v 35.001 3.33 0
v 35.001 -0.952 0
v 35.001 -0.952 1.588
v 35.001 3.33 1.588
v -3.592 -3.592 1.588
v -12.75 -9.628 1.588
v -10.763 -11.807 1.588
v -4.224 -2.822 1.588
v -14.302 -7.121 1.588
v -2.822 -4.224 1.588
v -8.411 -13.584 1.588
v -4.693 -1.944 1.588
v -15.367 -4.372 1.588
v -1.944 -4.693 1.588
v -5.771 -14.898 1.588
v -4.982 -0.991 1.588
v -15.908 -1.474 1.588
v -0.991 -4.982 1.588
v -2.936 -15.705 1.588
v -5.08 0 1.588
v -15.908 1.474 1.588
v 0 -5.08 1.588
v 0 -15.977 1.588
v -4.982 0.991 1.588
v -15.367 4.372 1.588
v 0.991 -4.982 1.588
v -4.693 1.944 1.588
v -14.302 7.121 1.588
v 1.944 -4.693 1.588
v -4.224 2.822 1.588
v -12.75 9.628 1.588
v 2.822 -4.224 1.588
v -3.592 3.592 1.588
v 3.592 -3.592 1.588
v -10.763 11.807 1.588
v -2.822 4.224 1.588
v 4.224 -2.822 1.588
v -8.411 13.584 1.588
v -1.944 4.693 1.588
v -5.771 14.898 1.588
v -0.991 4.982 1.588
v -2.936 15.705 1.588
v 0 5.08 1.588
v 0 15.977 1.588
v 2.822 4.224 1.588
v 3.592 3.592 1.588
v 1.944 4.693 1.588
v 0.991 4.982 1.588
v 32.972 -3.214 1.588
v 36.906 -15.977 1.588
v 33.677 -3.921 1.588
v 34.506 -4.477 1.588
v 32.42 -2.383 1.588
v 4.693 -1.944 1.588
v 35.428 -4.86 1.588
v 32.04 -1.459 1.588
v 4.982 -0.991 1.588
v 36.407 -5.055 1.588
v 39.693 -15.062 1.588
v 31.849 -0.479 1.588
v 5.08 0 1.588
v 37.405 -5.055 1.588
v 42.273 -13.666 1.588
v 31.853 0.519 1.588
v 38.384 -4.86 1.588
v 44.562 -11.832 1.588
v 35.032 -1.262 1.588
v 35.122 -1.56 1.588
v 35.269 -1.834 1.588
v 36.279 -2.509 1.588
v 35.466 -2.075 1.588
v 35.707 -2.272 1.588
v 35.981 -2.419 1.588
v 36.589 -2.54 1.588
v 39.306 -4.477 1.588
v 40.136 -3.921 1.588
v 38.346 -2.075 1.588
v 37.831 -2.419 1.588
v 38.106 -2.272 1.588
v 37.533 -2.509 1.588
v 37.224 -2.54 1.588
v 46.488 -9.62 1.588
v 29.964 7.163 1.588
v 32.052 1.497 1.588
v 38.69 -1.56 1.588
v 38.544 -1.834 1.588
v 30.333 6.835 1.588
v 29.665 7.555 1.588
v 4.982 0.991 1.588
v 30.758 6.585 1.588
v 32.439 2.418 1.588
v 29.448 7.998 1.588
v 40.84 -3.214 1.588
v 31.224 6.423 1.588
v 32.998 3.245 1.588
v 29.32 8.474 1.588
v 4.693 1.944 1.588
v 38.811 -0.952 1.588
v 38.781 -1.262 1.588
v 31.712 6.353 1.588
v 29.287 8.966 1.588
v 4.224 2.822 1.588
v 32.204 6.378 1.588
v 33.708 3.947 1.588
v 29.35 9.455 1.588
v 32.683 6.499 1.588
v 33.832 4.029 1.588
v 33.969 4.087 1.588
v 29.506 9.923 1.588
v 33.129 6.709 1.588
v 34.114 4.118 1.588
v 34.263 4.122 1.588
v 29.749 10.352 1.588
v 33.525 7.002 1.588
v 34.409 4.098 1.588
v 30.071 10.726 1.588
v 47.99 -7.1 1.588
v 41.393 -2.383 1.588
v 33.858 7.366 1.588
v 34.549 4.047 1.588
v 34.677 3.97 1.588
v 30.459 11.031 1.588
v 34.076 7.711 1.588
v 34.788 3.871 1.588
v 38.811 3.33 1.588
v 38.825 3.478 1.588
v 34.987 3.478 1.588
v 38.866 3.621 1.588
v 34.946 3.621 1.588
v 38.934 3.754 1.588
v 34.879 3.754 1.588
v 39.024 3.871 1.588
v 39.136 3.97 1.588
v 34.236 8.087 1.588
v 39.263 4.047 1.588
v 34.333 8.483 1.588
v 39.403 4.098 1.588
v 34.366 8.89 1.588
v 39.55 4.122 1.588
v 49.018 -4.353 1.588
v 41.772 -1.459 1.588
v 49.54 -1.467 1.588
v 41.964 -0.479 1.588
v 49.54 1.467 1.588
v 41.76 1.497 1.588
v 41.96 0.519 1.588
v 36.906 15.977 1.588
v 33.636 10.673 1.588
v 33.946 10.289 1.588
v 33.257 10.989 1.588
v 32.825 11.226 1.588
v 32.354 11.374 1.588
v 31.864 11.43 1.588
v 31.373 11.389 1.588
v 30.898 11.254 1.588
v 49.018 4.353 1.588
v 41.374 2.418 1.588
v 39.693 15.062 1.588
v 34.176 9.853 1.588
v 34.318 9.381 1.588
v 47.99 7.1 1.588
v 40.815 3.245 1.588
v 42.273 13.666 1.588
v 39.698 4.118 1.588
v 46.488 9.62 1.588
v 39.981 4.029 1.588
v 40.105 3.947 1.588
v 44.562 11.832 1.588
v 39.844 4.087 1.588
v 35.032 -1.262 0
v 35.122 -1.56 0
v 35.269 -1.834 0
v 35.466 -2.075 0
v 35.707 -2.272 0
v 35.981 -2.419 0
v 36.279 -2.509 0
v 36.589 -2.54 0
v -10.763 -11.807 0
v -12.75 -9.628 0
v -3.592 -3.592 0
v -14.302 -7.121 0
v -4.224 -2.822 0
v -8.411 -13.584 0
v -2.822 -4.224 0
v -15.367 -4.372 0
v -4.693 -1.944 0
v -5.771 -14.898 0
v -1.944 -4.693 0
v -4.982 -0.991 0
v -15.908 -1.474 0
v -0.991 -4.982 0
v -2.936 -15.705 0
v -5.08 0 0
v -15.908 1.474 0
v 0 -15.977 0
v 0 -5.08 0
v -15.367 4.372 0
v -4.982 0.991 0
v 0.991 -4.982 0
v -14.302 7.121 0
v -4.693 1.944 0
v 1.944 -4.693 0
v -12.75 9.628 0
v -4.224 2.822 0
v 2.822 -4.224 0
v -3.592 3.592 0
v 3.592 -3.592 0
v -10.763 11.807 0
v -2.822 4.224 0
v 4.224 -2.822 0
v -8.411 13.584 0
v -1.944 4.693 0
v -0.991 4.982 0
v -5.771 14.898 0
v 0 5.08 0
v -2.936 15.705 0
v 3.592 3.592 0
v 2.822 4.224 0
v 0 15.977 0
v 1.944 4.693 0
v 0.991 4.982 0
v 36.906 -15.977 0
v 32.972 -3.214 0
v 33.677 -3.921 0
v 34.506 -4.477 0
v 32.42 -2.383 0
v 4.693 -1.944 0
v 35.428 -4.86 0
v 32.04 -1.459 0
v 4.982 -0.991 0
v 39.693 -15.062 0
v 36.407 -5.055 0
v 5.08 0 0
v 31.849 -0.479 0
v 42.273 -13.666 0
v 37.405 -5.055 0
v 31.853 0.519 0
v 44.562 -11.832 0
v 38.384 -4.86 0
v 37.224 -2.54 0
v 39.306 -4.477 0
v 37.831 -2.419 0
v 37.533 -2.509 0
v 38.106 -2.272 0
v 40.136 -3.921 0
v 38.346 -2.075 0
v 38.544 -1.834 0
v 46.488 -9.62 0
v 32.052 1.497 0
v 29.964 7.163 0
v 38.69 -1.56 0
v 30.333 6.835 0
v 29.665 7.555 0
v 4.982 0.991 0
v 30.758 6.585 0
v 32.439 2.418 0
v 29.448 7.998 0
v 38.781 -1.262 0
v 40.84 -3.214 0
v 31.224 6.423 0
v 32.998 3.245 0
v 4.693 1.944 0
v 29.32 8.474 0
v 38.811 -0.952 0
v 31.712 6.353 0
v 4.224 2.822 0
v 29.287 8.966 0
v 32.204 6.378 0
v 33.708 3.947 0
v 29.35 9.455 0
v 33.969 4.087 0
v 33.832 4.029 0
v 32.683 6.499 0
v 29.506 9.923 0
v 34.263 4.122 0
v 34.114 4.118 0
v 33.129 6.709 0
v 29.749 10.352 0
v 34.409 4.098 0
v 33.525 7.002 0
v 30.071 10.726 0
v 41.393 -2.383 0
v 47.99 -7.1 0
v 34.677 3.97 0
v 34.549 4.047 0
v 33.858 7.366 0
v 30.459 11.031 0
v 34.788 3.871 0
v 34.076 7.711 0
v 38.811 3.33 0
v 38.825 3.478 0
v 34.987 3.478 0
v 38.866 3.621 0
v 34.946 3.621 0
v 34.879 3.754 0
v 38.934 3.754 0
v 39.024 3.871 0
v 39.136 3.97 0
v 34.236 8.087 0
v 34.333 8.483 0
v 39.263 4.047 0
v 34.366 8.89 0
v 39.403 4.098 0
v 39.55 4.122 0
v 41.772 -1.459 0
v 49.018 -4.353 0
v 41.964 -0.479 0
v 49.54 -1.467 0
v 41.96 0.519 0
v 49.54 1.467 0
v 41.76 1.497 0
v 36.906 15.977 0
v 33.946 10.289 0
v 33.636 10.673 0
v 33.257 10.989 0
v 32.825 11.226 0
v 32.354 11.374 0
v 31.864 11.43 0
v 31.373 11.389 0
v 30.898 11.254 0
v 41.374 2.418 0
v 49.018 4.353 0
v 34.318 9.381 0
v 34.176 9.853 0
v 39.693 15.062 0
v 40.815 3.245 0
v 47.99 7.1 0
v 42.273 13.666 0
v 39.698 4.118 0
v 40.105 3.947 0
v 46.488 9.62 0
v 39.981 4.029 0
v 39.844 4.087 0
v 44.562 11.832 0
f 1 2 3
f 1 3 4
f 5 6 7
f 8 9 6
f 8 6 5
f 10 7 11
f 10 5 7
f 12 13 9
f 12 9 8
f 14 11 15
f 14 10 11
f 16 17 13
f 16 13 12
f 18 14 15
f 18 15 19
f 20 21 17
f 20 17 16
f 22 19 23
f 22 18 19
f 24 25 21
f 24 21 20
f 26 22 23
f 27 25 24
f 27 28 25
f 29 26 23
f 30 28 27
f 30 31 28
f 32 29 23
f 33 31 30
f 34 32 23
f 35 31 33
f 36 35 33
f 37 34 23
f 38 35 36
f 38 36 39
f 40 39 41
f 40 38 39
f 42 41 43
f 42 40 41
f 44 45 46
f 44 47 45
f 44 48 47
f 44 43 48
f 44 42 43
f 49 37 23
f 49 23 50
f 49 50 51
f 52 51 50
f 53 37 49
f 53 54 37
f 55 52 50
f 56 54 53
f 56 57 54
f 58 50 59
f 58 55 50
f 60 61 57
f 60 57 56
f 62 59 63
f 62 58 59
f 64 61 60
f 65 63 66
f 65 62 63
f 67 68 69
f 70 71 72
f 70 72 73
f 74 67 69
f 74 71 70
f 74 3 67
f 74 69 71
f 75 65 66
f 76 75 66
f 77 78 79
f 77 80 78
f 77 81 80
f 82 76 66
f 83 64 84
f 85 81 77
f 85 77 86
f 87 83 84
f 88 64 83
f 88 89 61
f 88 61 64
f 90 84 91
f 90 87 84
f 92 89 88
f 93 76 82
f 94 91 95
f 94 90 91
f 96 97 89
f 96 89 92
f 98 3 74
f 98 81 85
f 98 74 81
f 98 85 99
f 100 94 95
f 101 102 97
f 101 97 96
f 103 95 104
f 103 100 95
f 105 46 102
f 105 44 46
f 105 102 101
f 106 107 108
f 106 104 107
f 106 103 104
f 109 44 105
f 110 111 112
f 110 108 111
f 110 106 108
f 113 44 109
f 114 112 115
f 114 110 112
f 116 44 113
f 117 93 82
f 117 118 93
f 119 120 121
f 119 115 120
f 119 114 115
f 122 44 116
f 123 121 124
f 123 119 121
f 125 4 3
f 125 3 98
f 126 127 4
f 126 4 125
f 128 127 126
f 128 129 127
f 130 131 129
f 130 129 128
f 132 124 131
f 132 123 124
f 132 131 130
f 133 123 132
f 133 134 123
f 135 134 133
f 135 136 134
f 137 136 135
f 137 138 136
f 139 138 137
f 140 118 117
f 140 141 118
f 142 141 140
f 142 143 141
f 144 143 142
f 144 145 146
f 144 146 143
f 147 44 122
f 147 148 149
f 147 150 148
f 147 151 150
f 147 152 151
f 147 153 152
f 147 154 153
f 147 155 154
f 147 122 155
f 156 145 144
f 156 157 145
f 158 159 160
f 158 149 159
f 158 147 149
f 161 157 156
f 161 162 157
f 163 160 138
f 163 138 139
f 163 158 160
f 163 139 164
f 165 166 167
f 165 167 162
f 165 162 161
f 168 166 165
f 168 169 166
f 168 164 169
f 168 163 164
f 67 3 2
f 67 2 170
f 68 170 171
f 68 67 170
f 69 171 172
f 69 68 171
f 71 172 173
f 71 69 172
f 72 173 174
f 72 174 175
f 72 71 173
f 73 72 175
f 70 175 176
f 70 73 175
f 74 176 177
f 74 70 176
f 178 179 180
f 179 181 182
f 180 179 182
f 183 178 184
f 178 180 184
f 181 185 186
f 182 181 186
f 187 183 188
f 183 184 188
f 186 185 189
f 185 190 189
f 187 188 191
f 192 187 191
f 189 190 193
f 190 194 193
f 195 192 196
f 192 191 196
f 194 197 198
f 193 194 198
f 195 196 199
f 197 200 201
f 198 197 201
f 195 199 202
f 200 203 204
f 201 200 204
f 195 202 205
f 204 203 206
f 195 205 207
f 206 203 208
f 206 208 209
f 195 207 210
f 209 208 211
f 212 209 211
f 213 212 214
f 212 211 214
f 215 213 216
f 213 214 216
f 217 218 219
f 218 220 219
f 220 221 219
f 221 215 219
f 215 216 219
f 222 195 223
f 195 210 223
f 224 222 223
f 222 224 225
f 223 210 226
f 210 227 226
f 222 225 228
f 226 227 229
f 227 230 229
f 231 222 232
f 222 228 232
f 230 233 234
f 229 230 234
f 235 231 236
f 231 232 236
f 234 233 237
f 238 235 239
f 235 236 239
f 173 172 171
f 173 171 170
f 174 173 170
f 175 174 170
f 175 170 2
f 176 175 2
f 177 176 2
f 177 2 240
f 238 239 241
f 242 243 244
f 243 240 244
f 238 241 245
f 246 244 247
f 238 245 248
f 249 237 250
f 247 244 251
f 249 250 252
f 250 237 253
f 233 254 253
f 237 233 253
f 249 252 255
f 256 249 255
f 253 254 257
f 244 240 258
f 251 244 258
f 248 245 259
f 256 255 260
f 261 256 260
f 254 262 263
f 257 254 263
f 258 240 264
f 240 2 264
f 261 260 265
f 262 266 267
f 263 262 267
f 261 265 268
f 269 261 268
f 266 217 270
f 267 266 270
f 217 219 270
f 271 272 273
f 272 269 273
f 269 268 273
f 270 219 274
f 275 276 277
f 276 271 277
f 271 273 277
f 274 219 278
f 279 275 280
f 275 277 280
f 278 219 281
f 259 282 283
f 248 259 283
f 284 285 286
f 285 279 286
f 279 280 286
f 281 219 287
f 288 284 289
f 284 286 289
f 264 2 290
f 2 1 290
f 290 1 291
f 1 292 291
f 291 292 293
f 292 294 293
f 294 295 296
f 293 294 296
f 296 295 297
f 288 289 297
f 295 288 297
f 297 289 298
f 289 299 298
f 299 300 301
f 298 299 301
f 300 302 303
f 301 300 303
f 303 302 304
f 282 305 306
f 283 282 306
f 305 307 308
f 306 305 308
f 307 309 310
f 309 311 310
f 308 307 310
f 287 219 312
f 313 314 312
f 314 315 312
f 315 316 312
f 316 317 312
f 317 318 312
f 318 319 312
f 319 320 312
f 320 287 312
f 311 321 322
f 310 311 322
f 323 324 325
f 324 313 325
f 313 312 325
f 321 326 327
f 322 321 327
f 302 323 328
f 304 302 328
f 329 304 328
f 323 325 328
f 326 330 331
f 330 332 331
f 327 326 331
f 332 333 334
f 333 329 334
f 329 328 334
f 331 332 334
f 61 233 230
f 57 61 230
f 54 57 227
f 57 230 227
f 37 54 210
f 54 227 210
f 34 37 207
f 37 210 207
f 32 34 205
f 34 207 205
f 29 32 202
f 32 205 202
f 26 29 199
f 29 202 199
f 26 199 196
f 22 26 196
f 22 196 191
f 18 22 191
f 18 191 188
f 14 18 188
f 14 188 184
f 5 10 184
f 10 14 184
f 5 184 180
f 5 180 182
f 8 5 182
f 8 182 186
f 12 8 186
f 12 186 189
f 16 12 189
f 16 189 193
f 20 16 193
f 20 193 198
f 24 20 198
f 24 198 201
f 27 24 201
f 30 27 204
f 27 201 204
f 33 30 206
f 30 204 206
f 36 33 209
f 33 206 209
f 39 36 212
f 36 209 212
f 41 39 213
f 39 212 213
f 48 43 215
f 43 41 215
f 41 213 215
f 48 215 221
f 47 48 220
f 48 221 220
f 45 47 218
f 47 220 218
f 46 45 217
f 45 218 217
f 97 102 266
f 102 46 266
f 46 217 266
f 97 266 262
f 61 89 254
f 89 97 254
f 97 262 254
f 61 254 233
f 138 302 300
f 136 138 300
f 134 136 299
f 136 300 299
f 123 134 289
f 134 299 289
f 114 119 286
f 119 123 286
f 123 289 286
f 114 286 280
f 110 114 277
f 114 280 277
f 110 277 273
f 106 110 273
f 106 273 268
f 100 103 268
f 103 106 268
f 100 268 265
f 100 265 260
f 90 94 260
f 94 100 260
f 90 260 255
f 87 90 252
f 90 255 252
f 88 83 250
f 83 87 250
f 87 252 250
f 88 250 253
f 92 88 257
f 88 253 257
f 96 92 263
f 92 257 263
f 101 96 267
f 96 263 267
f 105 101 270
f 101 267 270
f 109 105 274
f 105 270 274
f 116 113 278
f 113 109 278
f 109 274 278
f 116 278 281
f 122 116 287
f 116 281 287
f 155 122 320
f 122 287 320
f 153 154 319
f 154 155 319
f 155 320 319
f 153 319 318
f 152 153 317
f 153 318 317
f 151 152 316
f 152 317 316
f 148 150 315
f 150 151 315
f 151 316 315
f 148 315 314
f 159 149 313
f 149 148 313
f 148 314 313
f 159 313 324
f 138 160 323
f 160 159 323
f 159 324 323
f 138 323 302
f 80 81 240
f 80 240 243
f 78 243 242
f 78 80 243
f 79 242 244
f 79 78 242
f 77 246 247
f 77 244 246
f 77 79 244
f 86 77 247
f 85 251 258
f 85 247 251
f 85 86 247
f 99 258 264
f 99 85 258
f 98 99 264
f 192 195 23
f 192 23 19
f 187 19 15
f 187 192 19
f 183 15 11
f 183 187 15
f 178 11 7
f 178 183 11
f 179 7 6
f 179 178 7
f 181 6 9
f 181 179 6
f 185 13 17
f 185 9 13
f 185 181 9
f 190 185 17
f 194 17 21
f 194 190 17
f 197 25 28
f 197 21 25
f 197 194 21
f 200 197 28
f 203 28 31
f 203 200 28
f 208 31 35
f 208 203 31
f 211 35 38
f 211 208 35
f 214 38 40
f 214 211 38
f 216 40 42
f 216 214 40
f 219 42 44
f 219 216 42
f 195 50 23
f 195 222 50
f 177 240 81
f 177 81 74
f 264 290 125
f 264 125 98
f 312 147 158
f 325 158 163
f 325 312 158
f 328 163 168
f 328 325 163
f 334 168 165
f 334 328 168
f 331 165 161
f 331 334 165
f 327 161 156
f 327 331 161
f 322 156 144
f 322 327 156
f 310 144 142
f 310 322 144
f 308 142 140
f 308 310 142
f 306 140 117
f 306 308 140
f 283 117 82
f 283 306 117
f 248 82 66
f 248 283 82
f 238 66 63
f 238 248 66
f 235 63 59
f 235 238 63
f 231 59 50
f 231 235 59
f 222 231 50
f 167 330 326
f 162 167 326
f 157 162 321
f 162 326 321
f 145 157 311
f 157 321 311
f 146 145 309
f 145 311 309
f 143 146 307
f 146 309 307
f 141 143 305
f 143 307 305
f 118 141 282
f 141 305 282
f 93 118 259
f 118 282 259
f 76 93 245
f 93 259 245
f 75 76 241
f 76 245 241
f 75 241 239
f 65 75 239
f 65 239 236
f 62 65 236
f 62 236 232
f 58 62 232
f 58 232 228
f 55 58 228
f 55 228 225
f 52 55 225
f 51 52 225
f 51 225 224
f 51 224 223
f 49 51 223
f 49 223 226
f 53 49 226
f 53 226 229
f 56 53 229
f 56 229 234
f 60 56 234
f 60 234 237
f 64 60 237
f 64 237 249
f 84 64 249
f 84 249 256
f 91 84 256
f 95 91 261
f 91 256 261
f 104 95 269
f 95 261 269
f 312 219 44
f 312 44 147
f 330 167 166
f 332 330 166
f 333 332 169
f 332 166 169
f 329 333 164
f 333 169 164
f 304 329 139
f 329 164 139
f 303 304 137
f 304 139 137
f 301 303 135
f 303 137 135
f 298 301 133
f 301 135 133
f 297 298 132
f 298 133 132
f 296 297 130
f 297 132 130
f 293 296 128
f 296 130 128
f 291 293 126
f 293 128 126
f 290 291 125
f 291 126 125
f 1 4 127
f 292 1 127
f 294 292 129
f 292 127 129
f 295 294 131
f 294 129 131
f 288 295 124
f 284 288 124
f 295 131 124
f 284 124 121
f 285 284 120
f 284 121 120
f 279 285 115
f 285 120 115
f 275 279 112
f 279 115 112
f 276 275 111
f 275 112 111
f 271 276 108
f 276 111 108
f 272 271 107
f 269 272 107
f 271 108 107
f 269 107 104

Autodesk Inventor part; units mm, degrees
ref_plane "YZ Plane" through (0, 0, 0) normal (1, 0, 0) x (0, 1, 0)
ref_plane "XZ Plane" through (0, 0, 0) normal (0, 1, 0) x (-1, 0, 0)
ref_plane "XY Plane" through (0, 0, 0) normal (0, 0, 1) x (1, 0, 0)
sketch "Sketch1" plane through (0, 0, 0) normal (0, 0, 1) x (1, 0, 0)
  circle A0 centre (0, 0) radius 15.9766
  line L0 (0, 0) -> (36.9062, 0)
  circle A1 centre (36.9062, 0) radius 15.9766
  line L1 (36.9062, 0) -> (49.6062, 0)
  line L2 (36.9062, 0) -> (36.9062, 15.9766)
  line L3 (36.9062, 0) -> (36.9062, -15.9766)
  arc A2 (36.9062, -15.9766) -> (36.9062, 15.9766) centre (33.2069, 0) ccw
  circle A3 centre (36.9062, 0) radius 5.08
  circle A4 centre (0, 0) radius 5.08
  line L4 (0, 15.9766) -> (36.9062, 15.9766)
  line L5 (36.9062, -15.9766) -> (0, -15.9766)
  line L6 (31.8262, 0) -> (31.8262, 5.08)
  line L7 (31.8262, 5.08) -> (35.0012, 5.08)
  line L8 (35.0012, 5.08) -> (38.8112, 5.08)
  line L9 (38.8112, 5.08) -> (38.8112, -2.54)
  line L10 (38.8112, -2.54) -> (35.0012, -2.54)
  line L11 (35.0012, -2.54) -> (35.0012, 5.08)
  line L12 (36.9062, 5.08) -> (31.8262, 8.89)
  circle A5 centre (31.8262, 8.89) radius 2.54
  point P0 (35.0012, 4.7093)
  point P1 (38.8112, 4.7093)
  dimension "d3" = 10.16
  dimension "d0" = 31.9532
  dimension "d1" = 36.9062
  dimension "d2" = 12.7
  dimension "d4" = 10.16
  dimension "d5" = 3.175
  dimension "d6" = 3.81
  dimension "d7" = 7.62
  dimension "d12" = 6.35
  dimension "d13" = 5.08
extrude "Extrusion1" add sketch "Sketch1" along normal blind 1.5875 contours A0 | L0 A1 L5 A0 | A0 L4 A1 L0 | A1 L2 L8 L7 L6 L0 | L0 A3 L3 A1 | A2 L1 A3 L9 L8 L2 | L3 A3 L1 A2 | L6 L7 L11 A3 | A3 L9 L1 L2 | L8 L9 A3 | L2 L0 L11 A3 | A3 L11 L8 | L0 L3 L10 L11 | L1 L9 L10 L3
fillet "Fillet1" radius 1.5875 2 edges at (38.8112, -2.54, 0.7937) (35.0012, -2.54, 0.7937)
fillet "Fillet2" radius 0.7937 2 edges at (35.0012, 4.7093, 0.7937) (38.8112, 4.7093, 0.7937)
properties part number "new_winch_pto_poly"
